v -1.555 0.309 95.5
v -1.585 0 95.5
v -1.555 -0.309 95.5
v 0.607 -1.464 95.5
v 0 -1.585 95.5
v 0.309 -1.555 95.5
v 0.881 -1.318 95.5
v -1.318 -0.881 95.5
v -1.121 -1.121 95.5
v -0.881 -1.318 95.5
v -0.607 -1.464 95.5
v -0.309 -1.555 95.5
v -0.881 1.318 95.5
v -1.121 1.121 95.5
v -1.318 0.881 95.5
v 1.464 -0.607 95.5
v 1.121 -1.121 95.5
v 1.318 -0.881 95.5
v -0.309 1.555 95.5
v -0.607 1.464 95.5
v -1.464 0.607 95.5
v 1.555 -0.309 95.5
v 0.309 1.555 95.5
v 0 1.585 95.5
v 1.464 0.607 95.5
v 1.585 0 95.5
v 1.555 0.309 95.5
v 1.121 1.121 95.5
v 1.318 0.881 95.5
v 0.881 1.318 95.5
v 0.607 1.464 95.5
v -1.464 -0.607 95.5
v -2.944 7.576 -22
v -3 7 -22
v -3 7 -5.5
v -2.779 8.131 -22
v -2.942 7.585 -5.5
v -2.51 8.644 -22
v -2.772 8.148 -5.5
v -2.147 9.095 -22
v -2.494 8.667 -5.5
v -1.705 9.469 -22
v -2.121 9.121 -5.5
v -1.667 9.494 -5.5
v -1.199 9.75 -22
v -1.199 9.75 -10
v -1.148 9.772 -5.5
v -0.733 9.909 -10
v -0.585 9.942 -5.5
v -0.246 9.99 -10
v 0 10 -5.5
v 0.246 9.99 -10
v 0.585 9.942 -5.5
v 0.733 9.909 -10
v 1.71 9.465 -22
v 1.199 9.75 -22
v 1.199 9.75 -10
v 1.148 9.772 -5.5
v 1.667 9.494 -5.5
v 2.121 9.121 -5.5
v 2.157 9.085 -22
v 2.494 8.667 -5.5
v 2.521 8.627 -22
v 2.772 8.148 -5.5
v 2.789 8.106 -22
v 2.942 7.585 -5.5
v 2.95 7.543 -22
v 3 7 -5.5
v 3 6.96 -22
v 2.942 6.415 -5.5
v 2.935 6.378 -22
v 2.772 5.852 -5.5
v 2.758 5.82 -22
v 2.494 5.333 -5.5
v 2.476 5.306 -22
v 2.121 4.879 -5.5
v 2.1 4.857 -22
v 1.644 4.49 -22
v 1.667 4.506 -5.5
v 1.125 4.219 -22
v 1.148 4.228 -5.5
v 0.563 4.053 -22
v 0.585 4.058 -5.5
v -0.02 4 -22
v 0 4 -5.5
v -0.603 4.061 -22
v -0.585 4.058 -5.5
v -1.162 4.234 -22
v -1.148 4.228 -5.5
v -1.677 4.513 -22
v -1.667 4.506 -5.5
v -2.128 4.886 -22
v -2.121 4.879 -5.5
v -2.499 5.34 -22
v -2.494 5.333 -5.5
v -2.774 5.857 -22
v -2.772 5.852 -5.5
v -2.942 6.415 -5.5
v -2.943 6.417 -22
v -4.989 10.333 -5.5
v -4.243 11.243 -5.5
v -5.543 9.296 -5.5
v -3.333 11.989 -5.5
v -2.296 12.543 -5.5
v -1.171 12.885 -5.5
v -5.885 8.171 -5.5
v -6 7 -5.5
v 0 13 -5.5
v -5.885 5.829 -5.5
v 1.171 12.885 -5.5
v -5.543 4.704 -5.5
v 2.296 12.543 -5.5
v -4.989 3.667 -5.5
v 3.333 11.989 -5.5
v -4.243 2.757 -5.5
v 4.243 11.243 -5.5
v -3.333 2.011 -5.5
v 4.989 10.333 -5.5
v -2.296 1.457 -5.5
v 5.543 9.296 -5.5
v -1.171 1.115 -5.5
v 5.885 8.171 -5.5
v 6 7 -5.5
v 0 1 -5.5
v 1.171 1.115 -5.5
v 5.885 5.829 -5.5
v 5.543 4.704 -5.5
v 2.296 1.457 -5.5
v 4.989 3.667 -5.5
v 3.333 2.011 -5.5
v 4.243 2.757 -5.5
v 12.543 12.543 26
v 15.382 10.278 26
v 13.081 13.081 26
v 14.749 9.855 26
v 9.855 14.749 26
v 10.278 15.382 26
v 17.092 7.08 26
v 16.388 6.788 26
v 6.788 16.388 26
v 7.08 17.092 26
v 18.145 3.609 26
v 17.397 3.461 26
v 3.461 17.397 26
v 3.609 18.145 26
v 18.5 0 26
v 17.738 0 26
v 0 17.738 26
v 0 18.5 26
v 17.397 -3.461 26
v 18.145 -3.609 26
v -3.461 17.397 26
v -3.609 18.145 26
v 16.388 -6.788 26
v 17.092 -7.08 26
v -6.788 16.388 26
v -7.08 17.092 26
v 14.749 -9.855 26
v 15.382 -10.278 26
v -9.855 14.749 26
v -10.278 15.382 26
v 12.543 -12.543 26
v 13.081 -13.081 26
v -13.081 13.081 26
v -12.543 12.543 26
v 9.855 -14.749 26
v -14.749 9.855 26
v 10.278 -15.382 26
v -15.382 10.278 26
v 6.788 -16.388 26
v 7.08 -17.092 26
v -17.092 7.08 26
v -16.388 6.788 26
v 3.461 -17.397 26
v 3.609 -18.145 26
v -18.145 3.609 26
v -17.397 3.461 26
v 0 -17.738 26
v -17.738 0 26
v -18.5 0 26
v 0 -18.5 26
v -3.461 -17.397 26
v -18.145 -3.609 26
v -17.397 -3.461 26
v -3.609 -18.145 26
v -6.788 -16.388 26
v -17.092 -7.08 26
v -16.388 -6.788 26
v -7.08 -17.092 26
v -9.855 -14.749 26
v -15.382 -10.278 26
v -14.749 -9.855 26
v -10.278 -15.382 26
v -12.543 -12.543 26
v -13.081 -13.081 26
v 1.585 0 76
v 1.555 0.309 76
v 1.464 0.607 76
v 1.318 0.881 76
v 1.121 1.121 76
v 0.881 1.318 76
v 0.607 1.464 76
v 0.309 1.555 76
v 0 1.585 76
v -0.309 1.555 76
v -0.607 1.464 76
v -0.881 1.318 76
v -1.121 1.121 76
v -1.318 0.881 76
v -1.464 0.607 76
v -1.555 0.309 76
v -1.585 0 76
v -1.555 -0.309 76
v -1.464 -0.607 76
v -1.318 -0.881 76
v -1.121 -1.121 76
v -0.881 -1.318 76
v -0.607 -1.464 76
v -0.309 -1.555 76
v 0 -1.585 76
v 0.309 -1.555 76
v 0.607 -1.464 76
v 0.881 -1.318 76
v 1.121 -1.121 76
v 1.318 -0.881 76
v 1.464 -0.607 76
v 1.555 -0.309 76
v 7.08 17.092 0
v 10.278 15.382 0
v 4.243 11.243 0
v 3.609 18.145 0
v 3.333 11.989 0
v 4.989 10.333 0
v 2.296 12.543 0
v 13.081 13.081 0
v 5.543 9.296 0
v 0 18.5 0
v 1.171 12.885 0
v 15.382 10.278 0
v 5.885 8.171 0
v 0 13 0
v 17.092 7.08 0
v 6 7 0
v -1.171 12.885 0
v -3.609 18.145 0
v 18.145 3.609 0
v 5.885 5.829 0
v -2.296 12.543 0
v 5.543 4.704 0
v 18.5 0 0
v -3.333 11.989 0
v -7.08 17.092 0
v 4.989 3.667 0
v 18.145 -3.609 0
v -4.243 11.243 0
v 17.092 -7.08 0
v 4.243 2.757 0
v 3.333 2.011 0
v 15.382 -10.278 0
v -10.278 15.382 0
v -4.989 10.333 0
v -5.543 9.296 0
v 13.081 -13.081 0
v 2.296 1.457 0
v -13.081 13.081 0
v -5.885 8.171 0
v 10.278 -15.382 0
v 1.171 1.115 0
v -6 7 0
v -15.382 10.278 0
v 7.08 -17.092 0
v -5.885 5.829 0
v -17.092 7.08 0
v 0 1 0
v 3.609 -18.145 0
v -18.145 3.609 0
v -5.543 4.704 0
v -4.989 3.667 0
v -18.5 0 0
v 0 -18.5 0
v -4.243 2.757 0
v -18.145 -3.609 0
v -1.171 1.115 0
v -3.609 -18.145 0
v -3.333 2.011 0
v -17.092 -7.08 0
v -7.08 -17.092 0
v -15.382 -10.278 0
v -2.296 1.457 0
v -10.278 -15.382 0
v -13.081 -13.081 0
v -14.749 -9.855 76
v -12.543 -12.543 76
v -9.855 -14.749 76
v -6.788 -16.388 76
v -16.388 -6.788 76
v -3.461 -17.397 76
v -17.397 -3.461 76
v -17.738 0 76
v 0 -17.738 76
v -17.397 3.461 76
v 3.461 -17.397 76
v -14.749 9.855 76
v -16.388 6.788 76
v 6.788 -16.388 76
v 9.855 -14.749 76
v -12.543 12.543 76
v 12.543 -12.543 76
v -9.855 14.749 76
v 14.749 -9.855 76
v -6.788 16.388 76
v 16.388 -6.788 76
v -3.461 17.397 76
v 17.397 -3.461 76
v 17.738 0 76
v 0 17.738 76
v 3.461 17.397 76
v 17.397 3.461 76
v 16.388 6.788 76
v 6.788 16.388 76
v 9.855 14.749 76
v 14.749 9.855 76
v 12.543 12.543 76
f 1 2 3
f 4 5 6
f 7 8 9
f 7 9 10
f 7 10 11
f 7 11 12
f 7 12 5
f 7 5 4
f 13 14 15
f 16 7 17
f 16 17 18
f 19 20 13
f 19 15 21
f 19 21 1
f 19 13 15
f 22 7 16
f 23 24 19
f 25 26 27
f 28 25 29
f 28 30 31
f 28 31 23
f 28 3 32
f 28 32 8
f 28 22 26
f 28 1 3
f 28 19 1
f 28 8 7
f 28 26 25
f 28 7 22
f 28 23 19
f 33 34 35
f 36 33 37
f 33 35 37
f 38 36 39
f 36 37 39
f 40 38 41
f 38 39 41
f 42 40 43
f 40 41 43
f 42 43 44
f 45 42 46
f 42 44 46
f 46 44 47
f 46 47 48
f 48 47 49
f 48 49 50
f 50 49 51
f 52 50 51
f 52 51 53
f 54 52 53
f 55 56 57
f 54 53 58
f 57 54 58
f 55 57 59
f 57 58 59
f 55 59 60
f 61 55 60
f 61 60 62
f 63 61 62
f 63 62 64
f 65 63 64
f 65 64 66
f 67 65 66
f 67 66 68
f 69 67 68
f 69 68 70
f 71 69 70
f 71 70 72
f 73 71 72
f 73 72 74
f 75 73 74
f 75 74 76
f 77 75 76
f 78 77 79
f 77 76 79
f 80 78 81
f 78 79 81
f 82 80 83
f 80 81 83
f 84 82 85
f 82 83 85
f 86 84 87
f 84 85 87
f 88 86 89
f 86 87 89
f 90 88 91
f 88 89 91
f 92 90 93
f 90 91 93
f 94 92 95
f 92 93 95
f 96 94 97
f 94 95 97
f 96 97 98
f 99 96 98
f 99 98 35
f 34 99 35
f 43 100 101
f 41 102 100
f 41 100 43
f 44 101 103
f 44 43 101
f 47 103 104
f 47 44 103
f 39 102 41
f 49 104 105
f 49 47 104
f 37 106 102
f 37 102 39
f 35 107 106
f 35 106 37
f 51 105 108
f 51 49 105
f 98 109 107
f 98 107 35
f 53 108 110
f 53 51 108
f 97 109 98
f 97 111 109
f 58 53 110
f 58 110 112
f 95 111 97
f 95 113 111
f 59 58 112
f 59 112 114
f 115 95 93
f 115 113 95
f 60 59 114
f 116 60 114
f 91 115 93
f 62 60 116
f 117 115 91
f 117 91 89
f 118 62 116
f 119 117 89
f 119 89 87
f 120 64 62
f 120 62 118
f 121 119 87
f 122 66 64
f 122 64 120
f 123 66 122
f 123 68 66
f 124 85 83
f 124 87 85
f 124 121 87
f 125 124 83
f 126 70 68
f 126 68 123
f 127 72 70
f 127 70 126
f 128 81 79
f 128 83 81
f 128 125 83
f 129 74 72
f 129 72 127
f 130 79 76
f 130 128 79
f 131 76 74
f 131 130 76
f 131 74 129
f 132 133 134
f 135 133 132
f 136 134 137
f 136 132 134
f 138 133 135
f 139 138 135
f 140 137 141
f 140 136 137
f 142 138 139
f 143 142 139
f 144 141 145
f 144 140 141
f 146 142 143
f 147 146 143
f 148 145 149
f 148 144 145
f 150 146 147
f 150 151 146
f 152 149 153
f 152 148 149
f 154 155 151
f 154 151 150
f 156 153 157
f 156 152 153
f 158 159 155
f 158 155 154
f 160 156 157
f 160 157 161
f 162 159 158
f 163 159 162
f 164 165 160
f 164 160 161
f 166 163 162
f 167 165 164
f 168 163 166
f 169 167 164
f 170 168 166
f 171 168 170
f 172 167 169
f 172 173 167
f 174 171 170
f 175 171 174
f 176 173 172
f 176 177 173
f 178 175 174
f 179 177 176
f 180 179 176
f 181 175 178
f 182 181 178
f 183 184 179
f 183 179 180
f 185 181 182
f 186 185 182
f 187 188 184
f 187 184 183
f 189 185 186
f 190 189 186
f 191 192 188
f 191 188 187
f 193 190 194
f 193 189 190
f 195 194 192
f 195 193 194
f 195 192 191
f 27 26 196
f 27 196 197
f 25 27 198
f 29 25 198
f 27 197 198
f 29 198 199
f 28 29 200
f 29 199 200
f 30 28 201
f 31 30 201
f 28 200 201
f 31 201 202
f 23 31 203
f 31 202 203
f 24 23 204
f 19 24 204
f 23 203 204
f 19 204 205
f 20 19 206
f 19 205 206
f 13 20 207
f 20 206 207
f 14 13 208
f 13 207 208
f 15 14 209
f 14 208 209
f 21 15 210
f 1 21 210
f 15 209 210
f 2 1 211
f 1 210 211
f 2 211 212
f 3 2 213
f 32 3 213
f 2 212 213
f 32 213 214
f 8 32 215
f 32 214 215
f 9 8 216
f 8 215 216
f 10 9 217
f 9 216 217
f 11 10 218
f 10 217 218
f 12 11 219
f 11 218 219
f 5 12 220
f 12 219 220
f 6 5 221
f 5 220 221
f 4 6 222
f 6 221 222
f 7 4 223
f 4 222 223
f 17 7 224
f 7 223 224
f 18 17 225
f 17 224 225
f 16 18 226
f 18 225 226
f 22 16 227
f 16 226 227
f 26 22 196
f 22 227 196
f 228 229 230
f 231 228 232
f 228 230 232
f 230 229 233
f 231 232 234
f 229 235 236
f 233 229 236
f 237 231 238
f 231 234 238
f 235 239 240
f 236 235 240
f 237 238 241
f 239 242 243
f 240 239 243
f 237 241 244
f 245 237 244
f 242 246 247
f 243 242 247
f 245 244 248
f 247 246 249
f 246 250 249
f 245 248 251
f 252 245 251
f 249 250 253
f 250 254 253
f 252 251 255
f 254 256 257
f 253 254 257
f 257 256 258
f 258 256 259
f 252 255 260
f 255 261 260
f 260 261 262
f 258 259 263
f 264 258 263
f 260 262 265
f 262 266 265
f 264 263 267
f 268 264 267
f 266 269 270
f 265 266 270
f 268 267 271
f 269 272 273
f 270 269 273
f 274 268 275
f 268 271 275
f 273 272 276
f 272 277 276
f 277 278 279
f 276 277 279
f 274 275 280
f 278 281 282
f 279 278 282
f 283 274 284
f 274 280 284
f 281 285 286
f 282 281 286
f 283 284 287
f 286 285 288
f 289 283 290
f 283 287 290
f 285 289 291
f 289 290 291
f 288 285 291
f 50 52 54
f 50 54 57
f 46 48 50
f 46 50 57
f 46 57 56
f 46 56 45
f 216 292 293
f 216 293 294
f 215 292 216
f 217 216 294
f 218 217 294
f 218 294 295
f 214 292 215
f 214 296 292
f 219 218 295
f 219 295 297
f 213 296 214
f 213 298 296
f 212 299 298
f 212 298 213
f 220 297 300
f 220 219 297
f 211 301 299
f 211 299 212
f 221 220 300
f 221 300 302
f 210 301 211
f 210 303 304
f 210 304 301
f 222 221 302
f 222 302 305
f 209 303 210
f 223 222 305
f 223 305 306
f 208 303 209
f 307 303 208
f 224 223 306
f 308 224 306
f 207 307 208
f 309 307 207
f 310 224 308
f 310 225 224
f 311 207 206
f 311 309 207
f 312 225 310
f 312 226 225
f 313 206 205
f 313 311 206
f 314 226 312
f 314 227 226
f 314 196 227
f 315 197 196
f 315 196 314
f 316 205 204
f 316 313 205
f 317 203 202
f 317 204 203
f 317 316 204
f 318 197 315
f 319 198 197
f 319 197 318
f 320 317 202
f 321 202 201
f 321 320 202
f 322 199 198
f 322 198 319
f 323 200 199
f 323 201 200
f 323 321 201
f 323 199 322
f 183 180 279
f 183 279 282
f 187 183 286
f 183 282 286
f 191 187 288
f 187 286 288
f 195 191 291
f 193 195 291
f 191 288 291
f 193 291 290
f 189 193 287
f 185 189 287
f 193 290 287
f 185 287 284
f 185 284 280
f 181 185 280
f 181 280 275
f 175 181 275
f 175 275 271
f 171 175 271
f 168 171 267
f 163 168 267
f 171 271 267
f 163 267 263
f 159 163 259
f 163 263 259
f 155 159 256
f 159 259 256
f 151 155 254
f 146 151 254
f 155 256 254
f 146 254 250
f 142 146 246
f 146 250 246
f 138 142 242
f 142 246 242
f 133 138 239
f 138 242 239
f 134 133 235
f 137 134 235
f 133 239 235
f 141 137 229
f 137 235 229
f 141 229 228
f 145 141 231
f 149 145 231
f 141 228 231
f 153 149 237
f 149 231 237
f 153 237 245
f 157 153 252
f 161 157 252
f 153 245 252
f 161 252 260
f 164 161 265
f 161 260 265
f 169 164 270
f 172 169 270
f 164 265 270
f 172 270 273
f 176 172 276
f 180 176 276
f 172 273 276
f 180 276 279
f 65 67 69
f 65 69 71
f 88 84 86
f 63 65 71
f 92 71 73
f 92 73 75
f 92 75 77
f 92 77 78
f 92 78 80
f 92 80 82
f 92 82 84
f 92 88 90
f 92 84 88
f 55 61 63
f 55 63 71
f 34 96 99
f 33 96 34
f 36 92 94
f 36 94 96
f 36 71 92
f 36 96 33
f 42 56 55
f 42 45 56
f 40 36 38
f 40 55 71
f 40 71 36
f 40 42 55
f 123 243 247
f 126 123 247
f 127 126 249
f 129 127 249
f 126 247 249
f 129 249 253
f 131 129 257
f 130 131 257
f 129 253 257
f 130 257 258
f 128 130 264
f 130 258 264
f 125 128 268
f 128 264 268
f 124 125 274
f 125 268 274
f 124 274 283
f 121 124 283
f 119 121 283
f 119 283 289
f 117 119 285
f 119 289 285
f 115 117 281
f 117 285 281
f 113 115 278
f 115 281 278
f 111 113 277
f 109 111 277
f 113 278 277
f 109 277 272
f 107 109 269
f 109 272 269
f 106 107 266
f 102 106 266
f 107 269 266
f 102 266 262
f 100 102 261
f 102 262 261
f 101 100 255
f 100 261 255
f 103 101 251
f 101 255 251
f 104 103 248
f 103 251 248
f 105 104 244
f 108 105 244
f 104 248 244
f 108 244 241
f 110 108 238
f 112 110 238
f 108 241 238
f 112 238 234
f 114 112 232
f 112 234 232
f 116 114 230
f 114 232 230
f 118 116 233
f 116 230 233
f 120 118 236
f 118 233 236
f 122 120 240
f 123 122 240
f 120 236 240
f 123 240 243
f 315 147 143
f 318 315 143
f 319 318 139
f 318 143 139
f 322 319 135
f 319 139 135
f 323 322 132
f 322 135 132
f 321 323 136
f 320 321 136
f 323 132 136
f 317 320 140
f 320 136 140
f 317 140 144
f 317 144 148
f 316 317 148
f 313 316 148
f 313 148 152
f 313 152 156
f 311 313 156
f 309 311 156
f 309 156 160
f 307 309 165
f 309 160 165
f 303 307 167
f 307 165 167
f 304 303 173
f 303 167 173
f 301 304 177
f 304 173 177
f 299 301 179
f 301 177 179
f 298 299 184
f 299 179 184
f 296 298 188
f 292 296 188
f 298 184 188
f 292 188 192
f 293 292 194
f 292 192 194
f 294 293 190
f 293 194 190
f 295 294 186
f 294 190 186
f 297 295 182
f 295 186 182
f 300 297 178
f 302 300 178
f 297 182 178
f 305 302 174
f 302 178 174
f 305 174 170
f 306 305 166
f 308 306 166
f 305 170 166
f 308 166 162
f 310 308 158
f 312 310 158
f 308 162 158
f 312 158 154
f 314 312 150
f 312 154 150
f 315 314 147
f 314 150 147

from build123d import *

# Parameters (mm, degrees)
SKETCH2_R               = 18.5
BOSS_EXTRUDE1_DEPTH     = 26
SKETCH3_R               = 17.738120084
BOSS_EXTRUDE2_DEPTH     = 50
SKETCH4_R               = 1.585
BOSS_EXTRUDE3_DEPTH     = 19.5
SKETCH5_R               = 6
BOSS_EXTRUDE4_DEPTH     = 5.5
SKETCH6_R               = 3
BOSS_EXTRUDE5_DEPTH     = 16.5
CUT_EXTRUDE1_DEPTH      = 121.377531126
CUT_EXTRUDE1_DEPTH_BACK = 12


with BuildPart() as part:
    # Sketch2 → Boss-Extrude1 (new body)
    with BuildSketch(Plane.XY):
        with Locations(Location((0, 0, 0), (0, 0, 180))):
            Circle(SKETCH2_R)
    extrude(amount=BOSS_EXTRUDE1_DEPTH)

    # Sketch3 → Boss-Extrude2 (add)
    with BuildSketch(Plane.XY.offset(26)):
        Circle(SKETCH3_R)
    extrude(amount=BOSS_EXTRUDE2_DEPTH)

    # Sketch4 → Boss-Extrude3 (add)
    with BuildSketch(Plane.XY.offset(76)):
        Circle(SKETCH4_R)
    extrude(amount=BOSS_EXTRUDE3_DEPTH)

    # Sketch5 → Boss-Extrude4 (add)
    with BuildSketch(Plane(origin=(0, 0, 0), x_dir=(-1, 0, 0), z_dir=(0, 0, -1))):
        with Locations(Location((0, 7, 0), (0, 0, 180))):
            Circle(SKETCH5_R)
    extrude(amount=BOSS_EXTRUDE4_DEPTH)

    # Sketch6 → Boss-Extrude5 (add)
    with BuildSketch(Plane(origin=(0, 0, -5.5), x_dir=(-1, 0, 0), z_dir=(0, 0, -1))):
        with Locations((0, 7)):
            Circle(SKETCH6_R)
    extrude(amount=BOSS_EXTRUDE5_DEPTH)

    # Sketch7 → Cut-Extrude1 (cut, two sides: drawn at the far end of the back side and taken through both)
    with BuildSketch(Plane(origin=(0, 0, -22), x_dir=(-1, 0, 0), z_dir=(0, 0, -1)).offset(-CUT_EXTRUDE1_DEPTH_BACK)):
        with BuildLine():
            ThreePointArc((1.198957881, 9.75), (0, 10), (-1.198957881, 9.75))
            Line((-1.198957881, 9.75), (1.198957881, 9.75))
        make_face()
    extrude(amount=CUT_EXTRUDE1_DEPTH + CUT_EXTRUDE1_DEPTH_BACK, mode=Mode.SUBTRACT)


solid = part.part
